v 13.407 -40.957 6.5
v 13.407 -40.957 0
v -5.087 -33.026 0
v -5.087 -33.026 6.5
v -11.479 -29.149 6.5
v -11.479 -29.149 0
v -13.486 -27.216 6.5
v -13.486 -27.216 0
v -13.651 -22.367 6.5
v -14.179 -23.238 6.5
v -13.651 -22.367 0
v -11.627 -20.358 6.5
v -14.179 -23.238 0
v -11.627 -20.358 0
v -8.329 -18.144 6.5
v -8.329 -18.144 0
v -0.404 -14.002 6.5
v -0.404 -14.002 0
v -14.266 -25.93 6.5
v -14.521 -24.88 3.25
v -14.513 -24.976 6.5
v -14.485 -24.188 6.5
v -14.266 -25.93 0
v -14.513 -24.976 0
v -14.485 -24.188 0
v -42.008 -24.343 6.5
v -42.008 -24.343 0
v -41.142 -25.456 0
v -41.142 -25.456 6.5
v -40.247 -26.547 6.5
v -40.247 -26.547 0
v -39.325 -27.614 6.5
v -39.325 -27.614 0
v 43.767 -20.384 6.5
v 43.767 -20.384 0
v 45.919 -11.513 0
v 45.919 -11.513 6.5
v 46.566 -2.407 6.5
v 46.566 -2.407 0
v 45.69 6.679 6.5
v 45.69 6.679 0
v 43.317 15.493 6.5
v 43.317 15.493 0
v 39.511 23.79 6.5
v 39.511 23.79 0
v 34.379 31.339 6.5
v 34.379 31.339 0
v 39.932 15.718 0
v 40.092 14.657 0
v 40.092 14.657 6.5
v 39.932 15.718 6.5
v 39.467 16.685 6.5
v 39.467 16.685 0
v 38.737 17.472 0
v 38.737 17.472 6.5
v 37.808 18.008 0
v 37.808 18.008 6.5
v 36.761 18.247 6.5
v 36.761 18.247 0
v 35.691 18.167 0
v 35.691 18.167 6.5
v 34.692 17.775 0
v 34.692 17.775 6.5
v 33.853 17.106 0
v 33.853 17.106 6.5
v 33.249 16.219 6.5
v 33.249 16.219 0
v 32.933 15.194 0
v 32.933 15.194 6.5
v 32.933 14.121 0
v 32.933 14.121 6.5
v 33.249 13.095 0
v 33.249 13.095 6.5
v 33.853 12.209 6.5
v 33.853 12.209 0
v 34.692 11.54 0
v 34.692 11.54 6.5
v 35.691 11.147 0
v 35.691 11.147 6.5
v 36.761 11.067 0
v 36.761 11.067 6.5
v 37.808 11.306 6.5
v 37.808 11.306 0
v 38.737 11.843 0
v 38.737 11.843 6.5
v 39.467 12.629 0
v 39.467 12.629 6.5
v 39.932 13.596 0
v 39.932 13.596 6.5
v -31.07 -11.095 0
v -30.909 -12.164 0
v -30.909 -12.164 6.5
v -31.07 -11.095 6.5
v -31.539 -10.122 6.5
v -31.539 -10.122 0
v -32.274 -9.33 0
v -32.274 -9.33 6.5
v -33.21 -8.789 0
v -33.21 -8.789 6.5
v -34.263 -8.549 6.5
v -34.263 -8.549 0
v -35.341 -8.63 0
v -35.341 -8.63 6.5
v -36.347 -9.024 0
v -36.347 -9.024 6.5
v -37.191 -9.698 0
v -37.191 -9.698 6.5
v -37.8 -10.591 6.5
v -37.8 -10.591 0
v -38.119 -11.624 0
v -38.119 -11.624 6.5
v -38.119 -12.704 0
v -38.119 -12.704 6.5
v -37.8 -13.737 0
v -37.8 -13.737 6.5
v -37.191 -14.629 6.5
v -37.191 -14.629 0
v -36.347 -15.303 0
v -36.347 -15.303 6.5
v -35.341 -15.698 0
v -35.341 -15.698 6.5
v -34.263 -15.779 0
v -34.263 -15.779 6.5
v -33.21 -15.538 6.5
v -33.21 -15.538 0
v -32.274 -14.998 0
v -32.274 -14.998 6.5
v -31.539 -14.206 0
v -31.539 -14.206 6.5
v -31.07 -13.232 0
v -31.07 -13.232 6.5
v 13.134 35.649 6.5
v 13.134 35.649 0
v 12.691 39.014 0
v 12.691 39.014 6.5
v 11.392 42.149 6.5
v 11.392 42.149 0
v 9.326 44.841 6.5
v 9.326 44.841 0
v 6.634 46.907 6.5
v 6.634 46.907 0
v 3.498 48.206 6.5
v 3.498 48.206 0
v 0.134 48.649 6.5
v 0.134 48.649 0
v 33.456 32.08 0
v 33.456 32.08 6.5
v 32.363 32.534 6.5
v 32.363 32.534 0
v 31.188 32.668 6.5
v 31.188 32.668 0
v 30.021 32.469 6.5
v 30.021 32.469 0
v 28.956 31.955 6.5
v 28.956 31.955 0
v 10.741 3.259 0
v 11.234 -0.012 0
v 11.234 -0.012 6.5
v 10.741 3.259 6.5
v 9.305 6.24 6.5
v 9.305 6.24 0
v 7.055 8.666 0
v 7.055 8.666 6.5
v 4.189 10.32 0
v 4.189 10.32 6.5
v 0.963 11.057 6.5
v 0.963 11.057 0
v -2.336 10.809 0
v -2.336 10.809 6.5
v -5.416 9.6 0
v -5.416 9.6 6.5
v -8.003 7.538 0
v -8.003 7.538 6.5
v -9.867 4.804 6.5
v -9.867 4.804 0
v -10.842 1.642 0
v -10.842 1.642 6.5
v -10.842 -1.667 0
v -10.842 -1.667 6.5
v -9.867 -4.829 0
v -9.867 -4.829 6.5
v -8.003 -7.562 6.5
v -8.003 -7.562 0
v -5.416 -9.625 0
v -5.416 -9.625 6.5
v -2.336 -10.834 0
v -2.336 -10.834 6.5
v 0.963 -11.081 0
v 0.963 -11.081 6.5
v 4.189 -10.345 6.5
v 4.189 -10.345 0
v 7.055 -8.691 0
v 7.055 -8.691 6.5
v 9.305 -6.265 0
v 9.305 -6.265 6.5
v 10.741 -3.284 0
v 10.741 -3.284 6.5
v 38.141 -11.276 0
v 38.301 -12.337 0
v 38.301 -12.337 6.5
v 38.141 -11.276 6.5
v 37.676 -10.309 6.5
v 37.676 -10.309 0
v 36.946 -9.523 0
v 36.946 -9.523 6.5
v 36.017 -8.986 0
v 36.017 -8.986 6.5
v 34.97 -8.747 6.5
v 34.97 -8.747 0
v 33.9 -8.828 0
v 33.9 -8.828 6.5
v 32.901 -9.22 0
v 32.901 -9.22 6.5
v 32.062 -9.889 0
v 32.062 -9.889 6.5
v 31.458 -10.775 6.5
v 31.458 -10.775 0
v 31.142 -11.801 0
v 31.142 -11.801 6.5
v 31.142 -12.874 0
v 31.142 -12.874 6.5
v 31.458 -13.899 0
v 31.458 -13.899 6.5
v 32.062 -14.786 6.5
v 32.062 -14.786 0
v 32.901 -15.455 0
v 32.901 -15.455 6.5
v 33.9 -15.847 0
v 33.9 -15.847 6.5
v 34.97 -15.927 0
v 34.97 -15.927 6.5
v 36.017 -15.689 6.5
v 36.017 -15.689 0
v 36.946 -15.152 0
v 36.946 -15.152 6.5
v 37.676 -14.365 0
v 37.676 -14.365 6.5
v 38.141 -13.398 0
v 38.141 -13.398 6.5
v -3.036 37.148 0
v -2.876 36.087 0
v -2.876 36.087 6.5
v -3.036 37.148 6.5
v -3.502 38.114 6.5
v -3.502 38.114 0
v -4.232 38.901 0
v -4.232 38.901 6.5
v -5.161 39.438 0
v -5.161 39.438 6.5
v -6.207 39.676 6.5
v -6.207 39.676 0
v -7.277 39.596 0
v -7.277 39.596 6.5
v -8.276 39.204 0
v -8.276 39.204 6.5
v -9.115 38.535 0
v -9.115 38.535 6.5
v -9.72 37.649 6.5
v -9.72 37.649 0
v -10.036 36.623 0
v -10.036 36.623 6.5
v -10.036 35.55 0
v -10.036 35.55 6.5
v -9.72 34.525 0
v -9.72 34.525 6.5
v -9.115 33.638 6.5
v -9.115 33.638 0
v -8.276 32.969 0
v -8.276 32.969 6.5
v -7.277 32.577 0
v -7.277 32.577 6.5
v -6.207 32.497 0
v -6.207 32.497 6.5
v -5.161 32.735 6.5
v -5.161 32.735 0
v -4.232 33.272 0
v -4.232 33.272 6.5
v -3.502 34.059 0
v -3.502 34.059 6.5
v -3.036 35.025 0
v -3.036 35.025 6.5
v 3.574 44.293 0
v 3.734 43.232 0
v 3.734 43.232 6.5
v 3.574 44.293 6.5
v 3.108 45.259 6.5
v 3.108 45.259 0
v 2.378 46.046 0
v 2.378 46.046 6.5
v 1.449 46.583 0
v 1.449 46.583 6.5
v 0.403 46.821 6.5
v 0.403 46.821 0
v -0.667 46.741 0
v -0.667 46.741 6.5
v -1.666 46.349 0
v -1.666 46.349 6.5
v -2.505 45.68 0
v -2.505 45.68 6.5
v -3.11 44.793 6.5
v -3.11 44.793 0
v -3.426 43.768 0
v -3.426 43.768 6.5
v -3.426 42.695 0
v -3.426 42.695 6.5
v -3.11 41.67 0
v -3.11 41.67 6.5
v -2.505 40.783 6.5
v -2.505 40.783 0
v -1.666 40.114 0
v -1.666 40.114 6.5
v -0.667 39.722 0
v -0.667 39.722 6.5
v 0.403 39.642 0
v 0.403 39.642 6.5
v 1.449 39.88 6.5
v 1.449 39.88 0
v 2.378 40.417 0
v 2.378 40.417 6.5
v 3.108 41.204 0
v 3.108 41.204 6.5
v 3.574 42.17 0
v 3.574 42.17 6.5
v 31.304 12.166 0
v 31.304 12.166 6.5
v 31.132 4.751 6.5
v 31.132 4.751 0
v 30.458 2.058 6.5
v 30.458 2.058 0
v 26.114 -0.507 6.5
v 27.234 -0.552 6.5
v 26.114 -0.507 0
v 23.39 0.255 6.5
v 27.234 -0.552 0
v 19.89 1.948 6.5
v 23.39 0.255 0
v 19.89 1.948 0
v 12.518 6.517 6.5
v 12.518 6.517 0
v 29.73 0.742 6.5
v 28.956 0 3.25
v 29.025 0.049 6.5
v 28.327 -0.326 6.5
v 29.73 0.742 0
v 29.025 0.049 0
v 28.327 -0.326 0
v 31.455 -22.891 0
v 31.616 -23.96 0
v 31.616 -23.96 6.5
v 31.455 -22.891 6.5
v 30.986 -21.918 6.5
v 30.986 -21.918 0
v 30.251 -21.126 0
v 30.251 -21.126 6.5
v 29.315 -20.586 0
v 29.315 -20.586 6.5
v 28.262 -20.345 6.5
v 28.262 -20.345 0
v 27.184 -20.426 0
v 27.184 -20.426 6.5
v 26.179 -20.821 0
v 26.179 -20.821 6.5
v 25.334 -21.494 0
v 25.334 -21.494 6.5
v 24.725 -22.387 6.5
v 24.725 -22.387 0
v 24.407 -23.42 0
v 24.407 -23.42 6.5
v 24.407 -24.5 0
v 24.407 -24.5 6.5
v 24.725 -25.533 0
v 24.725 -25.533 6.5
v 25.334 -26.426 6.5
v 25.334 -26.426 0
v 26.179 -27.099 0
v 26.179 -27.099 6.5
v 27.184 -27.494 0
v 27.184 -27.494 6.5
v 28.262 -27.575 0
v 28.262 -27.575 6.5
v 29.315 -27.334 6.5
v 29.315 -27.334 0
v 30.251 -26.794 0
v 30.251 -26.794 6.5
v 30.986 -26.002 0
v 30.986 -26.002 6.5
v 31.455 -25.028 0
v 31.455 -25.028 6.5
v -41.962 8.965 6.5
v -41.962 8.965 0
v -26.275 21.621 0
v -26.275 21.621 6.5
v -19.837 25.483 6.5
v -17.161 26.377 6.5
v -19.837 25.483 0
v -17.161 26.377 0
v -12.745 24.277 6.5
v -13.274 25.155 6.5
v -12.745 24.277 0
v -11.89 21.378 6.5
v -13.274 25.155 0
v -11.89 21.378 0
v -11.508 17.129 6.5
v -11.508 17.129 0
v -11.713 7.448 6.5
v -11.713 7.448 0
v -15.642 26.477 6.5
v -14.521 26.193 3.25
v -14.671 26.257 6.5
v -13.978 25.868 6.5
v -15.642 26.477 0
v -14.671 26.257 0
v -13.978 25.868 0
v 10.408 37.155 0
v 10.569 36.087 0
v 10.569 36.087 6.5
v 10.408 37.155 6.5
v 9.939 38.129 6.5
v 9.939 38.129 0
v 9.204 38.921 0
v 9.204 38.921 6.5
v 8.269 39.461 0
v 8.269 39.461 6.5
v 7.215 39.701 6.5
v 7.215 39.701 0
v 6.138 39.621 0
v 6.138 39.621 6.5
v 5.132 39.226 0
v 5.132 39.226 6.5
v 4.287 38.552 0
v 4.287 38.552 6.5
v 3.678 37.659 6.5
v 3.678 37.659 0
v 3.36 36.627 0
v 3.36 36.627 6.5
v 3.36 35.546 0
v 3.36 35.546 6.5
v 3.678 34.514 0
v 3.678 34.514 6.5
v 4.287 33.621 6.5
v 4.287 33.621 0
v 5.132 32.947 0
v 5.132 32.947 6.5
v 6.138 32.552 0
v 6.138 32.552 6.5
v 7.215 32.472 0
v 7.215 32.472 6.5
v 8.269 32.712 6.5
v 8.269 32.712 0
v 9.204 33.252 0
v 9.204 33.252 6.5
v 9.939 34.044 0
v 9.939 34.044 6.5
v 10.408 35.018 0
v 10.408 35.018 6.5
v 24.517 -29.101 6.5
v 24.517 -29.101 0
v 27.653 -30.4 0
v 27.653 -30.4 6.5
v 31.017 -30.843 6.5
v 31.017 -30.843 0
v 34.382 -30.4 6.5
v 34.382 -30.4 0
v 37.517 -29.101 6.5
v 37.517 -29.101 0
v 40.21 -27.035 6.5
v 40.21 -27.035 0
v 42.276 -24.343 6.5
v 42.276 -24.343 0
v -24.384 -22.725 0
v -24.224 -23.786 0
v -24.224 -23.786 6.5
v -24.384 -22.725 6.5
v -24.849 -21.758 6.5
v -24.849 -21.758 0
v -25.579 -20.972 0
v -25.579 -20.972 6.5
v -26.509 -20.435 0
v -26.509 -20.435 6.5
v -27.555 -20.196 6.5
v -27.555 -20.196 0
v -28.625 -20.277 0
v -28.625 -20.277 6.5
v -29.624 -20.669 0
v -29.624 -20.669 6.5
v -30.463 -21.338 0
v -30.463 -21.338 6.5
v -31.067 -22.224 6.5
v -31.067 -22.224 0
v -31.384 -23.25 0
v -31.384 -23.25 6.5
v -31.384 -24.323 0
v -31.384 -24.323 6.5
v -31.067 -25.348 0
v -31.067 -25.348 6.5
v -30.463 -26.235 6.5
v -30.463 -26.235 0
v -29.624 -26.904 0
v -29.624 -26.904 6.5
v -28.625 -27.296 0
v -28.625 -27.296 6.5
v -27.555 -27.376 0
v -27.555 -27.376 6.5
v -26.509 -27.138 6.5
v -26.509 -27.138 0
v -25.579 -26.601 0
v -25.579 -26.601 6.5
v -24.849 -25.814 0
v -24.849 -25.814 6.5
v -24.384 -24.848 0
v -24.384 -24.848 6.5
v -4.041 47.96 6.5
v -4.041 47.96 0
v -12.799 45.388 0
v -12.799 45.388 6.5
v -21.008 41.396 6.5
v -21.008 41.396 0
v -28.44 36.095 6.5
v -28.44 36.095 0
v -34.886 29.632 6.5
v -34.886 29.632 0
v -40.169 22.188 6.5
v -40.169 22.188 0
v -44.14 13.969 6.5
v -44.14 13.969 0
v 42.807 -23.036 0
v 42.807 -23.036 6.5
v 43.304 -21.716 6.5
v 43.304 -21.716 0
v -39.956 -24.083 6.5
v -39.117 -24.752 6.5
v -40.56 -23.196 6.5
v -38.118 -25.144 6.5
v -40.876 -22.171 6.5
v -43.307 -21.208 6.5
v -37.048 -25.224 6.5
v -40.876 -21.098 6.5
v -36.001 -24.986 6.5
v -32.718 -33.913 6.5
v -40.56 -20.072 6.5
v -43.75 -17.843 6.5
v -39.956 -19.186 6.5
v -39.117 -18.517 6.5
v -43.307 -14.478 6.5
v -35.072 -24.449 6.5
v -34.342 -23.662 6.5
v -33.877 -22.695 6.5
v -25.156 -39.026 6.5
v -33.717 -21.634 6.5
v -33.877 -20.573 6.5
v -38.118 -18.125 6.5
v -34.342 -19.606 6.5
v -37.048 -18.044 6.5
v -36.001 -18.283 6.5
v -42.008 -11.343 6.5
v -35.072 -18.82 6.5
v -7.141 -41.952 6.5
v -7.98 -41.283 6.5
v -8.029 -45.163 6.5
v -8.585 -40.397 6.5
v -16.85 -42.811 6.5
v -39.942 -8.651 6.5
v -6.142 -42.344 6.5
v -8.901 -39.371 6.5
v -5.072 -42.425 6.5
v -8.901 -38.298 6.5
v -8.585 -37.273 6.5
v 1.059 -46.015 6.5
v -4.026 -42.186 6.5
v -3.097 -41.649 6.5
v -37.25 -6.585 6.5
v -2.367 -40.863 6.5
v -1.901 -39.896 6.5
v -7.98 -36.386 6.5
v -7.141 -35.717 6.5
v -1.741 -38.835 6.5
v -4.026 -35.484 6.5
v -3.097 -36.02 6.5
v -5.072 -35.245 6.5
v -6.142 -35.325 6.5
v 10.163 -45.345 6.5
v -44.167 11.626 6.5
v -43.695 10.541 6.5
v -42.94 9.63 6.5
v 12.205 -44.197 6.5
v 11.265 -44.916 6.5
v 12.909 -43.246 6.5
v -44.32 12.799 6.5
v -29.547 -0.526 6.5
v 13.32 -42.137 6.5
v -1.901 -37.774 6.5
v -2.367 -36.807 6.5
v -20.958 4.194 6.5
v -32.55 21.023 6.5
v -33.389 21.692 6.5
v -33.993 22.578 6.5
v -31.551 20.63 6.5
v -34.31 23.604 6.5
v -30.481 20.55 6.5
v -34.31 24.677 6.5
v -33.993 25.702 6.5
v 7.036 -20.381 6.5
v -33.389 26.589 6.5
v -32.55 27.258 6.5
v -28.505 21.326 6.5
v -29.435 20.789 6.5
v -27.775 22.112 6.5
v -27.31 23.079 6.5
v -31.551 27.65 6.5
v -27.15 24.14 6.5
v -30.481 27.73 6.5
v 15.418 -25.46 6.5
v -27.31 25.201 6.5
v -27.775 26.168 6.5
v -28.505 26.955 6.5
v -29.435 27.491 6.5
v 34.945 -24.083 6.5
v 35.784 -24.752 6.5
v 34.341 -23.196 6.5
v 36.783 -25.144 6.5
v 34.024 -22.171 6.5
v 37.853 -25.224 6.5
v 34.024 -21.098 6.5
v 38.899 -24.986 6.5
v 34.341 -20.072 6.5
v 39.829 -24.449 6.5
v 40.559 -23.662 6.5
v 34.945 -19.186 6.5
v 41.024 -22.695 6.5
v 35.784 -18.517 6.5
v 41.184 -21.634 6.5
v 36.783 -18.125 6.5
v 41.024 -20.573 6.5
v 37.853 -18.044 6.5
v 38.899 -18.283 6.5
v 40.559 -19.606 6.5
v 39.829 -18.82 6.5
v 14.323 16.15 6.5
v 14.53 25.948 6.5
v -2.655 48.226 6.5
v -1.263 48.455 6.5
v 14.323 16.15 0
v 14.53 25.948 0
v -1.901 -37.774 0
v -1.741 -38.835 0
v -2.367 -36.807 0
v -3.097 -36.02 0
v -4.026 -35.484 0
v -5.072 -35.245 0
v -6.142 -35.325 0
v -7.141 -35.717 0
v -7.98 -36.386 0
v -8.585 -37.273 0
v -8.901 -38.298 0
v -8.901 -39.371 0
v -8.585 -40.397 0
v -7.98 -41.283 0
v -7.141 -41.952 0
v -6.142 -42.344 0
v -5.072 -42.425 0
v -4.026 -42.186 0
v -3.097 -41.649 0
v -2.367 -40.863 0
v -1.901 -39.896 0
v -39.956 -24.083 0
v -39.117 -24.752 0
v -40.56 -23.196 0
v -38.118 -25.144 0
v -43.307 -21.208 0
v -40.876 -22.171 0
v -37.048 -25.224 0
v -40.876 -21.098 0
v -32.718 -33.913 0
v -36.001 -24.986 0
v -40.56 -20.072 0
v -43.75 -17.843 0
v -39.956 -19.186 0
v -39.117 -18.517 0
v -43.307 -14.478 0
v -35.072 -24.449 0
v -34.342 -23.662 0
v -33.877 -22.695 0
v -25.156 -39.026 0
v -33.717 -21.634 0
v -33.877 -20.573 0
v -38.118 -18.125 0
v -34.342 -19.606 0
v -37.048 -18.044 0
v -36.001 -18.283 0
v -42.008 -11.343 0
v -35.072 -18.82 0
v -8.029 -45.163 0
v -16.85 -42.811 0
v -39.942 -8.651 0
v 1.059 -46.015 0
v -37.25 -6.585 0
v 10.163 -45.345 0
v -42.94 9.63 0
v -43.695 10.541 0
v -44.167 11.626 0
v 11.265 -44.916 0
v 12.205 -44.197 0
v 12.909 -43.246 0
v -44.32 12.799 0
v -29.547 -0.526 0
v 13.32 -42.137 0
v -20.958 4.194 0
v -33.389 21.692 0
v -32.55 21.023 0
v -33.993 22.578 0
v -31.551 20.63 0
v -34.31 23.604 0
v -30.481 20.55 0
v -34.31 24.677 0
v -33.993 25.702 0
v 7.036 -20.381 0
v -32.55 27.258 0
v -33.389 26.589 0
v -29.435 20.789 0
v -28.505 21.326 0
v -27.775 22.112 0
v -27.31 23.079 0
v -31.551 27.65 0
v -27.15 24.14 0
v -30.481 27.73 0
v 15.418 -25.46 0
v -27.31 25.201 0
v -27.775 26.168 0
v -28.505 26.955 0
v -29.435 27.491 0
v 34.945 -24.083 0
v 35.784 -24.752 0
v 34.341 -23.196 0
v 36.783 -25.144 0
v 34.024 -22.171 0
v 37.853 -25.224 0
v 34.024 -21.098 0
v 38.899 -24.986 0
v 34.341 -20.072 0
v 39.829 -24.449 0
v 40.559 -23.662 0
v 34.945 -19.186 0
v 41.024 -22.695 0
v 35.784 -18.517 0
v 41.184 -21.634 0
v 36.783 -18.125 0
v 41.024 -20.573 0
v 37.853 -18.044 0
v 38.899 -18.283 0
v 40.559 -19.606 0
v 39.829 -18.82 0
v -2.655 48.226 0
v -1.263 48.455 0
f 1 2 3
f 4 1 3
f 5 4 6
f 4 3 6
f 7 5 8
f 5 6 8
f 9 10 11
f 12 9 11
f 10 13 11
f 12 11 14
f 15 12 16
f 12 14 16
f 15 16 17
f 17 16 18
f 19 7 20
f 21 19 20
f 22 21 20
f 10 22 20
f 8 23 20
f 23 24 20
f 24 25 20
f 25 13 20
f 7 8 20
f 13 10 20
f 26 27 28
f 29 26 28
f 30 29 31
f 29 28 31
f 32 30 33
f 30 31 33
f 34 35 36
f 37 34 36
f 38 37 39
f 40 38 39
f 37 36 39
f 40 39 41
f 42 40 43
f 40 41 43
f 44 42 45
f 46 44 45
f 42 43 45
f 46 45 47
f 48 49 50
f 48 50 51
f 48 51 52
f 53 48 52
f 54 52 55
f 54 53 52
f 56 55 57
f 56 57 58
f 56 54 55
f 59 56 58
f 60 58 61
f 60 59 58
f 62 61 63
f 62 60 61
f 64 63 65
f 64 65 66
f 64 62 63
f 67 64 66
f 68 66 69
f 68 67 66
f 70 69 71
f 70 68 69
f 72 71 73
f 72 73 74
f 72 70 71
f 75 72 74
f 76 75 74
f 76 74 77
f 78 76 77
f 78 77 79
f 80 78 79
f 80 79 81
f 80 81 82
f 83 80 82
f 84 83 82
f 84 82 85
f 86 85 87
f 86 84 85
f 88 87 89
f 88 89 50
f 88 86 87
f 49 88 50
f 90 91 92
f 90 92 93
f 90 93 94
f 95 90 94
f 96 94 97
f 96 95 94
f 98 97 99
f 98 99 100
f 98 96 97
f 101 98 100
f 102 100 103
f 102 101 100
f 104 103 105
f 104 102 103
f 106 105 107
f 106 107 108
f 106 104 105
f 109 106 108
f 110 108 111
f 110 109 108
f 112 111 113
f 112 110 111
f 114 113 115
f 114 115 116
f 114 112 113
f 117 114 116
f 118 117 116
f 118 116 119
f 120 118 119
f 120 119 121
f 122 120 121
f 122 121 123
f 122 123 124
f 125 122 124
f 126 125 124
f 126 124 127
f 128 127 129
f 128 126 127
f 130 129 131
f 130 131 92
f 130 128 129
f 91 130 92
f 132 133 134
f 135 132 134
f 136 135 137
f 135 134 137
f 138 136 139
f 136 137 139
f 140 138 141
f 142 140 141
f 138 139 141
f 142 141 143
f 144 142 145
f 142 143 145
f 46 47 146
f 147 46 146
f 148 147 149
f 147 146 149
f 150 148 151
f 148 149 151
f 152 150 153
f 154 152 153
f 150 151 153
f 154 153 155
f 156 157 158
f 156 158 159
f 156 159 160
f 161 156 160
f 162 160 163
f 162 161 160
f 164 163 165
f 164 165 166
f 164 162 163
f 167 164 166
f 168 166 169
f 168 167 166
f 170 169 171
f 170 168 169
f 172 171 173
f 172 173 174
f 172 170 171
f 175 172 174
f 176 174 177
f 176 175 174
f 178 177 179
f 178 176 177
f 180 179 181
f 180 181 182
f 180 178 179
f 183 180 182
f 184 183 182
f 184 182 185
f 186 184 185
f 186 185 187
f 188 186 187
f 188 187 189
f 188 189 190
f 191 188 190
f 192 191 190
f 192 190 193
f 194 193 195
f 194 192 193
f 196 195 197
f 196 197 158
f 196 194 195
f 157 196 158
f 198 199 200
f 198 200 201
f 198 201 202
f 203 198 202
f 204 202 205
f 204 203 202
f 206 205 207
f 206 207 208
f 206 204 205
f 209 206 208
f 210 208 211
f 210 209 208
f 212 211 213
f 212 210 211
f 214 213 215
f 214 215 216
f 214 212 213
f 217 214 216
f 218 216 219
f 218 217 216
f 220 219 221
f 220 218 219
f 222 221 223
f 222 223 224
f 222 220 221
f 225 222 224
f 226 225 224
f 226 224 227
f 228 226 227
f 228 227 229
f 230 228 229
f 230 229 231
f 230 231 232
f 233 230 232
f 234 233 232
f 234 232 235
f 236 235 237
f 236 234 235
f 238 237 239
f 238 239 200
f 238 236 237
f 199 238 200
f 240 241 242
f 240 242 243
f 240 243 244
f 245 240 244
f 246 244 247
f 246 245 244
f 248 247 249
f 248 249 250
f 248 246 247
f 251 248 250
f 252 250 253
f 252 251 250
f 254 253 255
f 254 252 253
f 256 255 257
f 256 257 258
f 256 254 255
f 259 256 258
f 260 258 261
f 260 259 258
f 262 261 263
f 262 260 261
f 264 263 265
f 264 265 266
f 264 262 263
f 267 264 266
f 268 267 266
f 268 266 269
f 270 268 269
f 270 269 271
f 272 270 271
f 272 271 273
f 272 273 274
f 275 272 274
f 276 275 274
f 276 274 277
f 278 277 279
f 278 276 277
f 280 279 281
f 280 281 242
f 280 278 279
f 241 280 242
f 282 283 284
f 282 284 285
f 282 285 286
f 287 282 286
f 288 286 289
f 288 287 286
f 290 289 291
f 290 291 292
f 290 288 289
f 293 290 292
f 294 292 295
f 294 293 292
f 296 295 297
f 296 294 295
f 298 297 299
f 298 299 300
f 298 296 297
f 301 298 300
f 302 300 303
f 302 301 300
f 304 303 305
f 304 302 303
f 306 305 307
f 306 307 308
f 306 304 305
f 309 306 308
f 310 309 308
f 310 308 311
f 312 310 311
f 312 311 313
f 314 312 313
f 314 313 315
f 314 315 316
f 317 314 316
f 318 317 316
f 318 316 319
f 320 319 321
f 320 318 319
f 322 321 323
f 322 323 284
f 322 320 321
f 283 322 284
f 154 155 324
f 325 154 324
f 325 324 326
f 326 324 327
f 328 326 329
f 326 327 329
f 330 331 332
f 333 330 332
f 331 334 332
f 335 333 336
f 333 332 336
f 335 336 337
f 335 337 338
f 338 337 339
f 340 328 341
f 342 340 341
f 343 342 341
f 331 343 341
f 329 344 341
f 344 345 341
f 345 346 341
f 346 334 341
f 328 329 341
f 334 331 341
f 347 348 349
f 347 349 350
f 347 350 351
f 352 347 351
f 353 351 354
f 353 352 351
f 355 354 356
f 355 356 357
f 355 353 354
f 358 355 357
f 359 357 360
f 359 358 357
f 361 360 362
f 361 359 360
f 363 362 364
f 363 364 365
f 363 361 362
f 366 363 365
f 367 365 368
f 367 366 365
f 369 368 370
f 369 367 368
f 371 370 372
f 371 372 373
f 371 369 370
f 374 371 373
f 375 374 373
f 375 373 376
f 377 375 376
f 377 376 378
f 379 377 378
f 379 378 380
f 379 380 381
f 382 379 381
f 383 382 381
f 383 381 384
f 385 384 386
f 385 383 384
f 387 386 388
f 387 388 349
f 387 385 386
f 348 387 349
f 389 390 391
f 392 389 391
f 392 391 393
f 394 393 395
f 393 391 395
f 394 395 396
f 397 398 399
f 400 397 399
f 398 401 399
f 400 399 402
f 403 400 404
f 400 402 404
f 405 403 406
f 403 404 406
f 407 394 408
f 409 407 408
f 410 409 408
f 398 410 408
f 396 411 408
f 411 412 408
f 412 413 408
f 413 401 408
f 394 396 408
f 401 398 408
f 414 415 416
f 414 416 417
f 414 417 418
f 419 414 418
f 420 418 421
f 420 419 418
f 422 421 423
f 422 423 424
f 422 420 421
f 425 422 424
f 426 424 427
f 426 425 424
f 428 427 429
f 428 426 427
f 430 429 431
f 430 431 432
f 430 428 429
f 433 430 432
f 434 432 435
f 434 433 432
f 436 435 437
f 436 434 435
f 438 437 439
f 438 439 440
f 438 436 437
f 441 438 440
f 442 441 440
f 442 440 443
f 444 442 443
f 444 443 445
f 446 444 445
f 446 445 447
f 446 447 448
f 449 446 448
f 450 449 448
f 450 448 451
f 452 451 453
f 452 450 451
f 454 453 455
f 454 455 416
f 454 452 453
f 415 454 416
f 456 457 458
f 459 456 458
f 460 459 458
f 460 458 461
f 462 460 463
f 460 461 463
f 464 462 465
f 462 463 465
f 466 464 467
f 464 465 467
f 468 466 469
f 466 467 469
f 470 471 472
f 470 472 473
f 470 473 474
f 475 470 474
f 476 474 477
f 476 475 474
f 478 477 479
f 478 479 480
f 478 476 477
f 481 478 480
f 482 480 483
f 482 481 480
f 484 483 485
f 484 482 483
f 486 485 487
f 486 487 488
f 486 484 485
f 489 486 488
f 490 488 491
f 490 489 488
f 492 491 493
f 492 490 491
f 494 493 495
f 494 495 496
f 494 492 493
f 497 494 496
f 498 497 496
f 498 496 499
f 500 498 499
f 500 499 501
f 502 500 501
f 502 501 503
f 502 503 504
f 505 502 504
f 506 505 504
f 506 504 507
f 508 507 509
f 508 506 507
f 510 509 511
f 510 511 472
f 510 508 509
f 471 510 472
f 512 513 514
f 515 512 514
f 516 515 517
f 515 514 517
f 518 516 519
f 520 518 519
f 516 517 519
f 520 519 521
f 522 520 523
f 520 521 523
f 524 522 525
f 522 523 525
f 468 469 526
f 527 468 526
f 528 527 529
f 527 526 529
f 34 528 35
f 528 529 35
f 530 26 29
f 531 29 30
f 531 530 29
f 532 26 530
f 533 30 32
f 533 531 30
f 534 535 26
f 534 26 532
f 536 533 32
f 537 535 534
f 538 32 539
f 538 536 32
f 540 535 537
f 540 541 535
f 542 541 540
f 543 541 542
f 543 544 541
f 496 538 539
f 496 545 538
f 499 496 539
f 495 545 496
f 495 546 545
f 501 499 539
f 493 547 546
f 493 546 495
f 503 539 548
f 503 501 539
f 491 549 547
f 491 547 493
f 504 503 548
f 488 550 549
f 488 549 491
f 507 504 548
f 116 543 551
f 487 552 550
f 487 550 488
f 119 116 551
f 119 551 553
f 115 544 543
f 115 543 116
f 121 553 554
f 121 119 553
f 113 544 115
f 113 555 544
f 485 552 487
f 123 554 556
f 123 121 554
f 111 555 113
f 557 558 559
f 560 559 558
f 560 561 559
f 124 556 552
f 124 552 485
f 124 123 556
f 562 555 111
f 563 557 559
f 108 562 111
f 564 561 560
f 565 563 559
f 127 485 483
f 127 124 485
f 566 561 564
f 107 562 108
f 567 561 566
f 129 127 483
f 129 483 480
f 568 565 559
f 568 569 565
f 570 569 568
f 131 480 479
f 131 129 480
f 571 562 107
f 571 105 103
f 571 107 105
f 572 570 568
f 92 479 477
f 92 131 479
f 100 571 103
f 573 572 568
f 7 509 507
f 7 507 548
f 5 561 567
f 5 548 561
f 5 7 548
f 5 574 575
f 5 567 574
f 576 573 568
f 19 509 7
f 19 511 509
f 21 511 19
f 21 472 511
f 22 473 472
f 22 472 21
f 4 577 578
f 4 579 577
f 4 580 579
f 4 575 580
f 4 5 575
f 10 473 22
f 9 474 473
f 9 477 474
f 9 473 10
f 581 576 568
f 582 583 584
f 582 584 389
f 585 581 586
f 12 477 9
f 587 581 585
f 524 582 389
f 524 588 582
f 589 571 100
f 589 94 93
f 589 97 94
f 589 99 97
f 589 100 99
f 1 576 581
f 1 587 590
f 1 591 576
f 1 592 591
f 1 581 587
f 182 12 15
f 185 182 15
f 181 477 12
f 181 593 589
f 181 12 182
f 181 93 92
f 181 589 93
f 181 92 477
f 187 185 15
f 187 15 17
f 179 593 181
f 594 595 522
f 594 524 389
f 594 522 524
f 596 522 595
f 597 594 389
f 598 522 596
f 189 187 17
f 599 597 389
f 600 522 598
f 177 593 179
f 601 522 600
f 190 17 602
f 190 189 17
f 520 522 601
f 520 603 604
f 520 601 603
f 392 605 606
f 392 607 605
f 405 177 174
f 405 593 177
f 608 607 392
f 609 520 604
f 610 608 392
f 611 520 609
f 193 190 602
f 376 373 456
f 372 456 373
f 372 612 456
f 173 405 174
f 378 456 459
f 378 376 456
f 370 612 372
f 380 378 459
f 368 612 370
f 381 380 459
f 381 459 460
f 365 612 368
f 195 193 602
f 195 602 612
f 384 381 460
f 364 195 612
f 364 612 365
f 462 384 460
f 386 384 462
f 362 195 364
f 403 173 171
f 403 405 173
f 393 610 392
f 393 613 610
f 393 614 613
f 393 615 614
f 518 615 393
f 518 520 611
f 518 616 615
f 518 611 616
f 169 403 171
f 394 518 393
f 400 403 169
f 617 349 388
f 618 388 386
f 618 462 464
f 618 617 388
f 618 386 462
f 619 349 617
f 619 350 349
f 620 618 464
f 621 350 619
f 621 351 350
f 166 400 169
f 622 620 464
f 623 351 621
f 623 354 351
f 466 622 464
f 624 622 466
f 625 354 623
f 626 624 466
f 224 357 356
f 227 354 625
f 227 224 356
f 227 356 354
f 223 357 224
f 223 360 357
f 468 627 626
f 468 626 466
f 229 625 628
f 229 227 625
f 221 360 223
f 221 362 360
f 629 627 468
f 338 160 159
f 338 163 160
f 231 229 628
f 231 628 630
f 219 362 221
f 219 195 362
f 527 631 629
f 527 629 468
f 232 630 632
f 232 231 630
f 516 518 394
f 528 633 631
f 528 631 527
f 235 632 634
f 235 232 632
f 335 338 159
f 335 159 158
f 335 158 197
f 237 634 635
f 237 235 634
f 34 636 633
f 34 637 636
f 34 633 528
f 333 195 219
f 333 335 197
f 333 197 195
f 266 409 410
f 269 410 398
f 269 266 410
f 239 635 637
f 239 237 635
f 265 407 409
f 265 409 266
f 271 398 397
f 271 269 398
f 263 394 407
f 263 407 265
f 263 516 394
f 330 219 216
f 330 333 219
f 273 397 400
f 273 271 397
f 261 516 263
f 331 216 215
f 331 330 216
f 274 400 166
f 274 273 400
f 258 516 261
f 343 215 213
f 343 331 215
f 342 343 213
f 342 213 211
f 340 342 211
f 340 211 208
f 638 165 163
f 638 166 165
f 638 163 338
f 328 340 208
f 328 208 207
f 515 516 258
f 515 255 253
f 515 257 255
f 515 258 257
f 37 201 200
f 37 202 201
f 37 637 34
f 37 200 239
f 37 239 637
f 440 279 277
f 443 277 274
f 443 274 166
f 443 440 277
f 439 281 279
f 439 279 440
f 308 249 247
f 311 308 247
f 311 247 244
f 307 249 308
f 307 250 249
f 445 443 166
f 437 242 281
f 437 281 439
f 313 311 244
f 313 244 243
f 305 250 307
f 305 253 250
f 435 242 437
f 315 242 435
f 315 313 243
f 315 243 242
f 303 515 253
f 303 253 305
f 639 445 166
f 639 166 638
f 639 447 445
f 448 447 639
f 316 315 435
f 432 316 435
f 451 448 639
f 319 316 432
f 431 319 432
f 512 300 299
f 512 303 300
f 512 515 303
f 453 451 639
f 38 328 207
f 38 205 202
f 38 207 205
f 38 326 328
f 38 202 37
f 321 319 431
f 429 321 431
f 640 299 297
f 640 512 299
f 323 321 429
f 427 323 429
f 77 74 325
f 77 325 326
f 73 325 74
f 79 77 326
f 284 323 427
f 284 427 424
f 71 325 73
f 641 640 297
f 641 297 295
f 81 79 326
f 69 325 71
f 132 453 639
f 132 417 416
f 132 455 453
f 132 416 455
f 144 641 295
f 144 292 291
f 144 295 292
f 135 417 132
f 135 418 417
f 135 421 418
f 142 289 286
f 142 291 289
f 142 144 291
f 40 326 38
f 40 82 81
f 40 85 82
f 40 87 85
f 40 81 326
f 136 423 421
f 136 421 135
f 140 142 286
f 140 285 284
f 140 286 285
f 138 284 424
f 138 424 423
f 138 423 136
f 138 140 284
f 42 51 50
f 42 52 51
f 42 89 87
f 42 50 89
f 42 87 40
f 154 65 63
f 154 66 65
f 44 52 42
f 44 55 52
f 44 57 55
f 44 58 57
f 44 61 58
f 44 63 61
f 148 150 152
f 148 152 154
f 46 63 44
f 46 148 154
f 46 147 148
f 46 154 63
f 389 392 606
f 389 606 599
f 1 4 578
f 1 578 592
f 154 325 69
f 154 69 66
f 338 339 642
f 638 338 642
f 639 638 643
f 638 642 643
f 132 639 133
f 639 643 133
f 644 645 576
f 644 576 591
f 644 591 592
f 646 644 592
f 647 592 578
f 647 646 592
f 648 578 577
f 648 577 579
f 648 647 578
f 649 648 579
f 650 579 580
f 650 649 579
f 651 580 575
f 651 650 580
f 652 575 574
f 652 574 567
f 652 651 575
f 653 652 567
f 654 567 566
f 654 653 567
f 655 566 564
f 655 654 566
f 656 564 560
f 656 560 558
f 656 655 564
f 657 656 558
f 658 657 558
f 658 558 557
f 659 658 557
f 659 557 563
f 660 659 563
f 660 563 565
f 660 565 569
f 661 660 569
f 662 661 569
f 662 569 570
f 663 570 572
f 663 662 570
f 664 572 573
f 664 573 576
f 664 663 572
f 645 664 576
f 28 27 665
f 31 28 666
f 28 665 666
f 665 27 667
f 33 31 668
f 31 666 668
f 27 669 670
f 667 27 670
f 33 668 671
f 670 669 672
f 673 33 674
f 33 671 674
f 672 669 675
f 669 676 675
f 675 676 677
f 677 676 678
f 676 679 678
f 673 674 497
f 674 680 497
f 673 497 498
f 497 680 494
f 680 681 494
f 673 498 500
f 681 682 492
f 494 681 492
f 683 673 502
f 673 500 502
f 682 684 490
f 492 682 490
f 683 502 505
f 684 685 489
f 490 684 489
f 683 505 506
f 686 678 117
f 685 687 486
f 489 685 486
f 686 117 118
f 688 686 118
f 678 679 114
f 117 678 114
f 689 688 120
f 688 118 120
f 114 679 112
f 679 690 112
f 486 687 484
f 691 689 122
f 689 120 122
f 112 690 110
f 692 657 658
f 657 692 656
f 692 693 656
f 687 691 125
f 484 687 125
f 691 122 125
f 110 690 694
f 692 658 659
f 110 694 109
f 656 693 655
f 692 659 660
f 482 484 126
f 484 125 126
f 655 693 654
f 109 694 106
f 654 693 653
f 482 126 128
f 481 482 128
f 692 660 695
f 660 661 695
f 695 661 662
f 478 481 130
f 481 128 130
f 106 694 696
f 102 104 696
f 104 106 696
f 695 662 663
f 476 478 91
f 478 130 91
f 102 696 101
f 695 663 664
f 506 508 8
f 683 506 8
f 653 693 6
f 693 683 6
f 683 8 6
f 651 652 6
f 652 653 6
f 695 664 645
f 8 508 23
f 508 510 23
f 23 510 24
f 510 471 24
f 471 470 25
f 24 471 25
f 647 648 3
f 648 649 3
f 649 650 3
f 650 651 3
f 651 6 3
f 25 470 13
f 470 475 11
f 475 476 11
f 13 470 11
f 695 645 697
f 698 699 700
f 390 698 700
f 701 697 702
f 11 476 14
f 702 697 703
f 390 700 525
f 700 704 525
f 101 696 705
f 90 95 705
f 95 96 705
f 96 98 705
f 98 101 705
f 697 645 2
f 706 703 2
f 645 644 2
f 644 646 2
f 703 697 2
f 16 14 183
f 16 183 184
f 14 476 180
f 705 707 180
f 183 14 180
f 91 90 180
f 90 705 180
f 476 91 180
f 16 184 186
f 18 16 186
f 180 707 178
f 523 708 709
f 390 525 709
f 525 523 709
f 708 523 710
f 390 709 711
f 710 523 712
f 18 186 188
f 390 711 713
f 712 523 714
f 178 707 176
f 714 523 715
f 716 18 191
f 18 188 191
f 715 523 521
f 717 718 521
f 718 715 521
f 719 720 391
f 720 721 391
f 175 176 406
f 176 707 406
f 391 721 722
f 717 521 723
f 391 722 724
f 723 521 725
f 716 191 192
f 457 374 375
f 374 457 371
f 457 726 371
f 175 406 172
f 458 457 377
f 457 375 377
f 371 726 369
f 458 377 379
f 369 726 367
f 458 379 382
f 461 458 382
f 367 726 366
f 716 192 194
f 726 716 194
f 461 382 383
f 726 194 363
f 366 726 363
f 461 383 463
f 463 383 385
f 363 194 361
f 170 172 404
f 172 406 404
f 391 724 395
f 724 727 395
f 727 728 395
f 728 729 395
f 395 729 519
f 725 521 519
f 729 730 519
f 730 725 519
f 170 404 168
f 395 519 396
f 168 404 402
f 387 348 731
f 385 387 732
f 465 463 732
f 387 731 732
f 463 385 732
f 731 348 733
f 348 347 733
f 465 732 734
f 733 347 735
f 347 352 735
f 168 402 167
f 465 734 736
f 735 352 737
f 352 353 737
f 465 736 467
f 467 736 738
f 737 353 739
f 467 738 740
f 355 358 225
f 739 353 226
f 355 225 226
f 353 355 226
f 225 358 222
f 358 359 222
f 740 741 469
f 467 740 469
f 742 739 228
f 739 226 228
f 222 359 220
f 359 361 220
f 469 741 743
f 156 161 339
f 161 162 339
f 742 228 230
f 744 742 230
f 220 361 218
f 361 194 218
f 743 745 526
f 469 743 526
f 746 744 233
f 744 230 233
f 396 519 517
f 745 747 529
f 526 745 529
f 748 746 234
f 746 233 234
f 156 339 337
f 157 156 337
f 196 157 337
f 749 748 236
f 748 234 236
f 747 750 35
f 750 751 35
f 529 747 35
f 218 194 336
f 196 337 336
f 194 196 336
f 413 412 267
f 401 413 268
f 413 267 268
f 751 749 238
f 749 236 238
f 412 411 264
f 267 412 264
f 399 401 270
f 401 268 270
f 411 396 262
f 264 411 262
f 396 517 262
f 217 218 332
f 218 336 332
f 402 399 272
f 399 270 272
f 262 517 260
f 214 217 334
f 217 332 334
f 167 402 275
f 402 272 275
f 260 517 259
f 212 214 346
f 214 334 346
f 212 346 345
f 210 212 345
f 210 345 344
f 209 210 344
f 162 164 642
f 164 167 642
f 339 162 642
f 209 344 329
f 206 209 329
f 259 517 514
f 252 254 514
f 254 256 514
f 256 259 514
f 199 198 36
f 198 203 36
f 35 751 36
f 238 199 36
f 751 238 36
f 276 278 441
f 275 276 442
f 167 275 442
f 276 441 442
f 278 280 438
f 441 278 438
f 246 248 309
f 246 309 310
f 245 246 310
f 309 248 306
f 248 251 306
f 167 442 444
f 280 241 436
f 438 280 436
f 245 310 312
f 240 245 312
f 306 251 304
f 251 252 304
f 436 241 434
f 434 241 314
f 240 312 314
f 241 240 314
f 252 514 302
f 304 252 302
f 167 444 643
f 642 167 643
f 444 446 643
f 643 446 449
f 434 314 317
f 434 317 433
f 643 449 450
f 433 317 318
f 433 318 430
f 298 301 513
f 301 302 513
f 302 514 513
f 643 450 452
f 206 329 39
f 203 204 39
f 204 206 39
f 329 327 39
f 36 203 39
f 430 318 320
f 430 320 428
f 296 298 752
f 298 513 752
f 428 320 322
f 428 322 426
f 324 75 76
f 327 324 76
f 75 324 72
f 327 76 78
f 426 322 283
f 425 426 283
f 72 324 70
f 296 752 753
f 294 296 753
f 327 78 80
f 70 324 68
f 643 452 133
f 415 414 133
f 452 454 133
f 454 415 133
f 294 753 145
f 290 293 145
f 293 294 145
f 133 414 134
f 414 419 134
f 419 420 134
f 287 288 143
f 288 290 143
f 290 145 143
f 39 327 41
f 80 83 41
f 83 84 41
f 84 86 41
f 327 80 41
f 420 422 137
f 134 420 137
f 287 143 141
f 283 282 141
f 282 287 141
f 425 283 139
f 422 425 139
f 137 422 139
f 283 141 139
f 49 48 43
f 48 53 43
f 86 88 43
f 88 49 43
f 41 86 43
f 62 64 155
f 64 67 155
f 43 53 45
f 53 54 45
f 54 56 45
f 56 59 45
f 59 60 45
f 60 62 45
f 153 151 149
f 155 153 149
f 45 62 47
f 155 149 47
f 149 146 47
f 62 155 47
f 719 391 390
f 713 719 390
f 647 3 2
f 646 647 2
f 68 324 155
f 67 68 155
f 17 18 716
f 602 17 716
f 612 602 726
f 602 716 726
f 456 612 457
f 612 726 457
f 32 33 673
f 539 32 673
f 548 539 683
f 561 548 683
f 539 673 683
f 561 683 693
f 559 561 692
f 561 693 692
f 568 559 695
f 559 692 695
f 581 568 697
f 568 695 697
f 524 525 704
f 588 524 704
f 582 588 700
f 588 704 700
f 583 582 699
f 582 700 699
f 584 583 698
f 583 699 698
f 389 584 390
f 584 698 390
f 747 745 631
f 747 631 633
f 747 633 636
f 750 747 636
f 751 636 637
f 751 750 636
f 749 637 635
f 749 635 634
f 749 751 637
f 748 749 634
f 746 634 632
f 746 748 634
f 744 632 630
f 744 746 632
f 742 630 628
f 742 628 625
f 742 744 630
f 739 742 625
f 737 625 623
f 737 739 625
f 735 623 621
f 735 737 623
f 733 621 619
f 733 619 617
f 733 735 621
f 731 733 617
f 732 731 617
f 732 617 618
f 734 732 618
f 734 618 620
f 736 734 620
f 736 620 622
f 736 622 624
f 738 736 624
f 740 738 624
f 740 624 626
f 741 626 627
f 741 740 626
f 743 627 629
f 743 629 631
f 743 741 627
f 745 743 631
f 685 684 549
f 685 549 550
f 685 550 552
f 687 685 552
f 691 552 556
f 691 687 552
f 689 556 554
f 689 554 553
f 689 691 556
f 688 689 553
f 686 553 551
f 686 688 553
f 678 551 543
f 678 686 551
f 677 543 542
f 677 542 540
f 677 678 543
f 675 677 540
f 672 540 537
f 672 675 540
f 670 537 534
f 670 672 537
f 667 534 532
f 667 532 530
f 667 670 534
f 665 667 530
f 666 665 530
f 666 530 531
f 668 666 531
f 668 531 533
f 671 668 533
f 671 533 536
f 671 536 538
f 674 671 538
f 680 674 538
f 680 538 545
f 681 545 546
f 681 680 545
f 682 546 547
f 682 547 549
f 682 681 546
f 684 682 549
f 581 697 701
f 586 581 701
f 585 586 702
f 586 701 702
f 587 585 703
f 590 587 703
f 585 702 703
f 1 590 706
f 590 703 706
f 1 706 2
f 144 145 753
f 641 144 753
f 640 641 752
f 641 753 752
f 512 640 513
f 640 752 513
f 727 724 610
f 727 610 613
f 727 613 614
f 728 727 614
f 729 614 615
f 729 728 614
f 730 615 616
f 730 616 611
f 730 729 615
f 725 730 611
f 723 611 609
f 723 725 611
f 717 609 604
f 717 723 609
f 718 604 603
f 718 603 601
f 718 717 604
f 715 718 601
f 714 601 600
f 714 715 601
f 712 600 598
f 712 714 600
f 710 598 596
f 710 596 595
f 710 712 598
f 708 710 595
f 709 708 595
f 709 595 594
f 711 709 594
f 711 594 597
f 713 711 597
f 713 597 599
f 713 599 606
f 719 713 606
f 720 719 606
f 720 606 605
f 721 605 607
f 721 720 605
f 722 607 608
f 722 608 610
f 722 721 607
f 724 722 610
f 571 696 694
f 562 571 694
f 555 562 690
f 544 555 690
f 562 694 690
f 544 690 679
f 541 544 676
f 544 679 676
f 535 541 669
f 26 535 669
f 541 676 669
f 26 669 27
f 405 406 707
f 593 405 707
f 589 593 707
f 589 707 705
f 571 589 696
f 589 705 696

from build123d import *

# Parameters (mm, degrees)
F0_R     = 3.6
F0_R_2   = 3.625
F0_R_3   = 11.1
F1_DEPTH = 6.5


with BuildPart() as f1:
    # F0 (on Top) → F1 (new body)
    with BuildSketch(Plane.XY):
        with BuildLine():
            add(Edge.make_bspline(
                [(-41.9615497958, 8.9646982505), (-30.569933299, 18.648762587), (-10.4654788804, 35.7396495649), (-11.3357932008, 16.00177224), (-11.7129686992, 7.4478009422)],
                knots=[0, 0, 0, 0, 0.5666215188, 1, 1, 1, 1], degree=3))
            ThreePointArc((-11.7129686992, 7.4478009422), (-9.5564167843, 17.8339532115), (-10.6477440022, 28.385345538))
            ThreePointArc((-10.6477440022, 28.385345538), (-12.0864234677, 31.2141495186), (-12.7968132244, 34.3072510298))
            ThreePointArc((-12.7968132244, 34.3072510298), (-10.809160747, 42.6668712415), (-4.0406760994, 47.9604171261))
            ThreePointArc((-4.0406760994, 47.9604171261), (-28.4395123023, 36.0950208303), (-44.1400961488, 13.9685094878))
            ThreePointArc((-44.1400961488, 13.9685094878), (-43.969487255, 11.0666381974), (-41.9615497958, 8.9646982505))
        make_face()
        with Locations((-30.7498083919, 24.1402272244)):
            Circle(F0_R, mode=Mode.SUBTRACT)
        with BuildLine():
            ThreePointArc((-12.7968132244, 34.3072510298), (-12.0864234677, 31.2141495186), (-10.6477440022, 28.385345538))
            ThreePointArc((-10.6477440022, 28.385345538), (-11.5872203484, 31.3953111499), (-12.7968132244, 34.3072510298))
        make_face()
        with BuildLine():
            ThreePointArc((10.1354725507, 9.7838140319), (11.2789155437, 8.1156101199), (12.5178738246, 6.5170643594))
            ThreePointArc((12.5178738246, 6.5170643594), (11.4452241776, 8.2368970077), (10.1354725507, 9.7838140319))
        make_face()
        with BuildLine():
            ThreePointArc((36.3207621947, -5.9740237918), (33.2868628312, -5.0426886121), (30.1177069889, -4.8742195868))
            ThreePointArc((30.1177069889, -4.8742195868), (33.1941518464, -5.5655920107), (36.3207621947, -5.9740237918))
        make_face()
        with BuildLine():
            ThreePointArc((-13.3508562664, 3.7512060808), (-12.4778707964, 5.5755587165), (-11.7129686992, 7.4478009422))
            ThreePointArc((-11.7129686992, 7.4478009422), (-12.6660626394, 5.6589427744), (-13.3508562664, 3.7512060808))
        make_face()
        with BuildLine():
            ThreePointArc((12.5178738246, 6.5170643594), (13.7237945853, 3.3508166981), (14.1337720544, -0.0124090761))
            ThreePointArc((14.1337720544, -0.0124090761), (11.1963438517, -8.5925900316), (3.6166998789, -13.572247341))
            ThreePointArc((3.6166998789, -13.572247341), (1.622154625, -13.9330670104), (-0.4035889622, -14.0020925299))
            ThreePointArc((-0.4035889622, -14.0020925299), (11.1232254291, -23.092711045), (24.5173530526, -29.1013831282))
            ThreePointArc((24.5173530526, -29.1013831282), (18.3513531402, -14.9151788691), (30.1177069889, -4.8742195868))
            ThreePointArc((30.1177069889, -4.8742195868), (20.43426958, -0.5436405181), (12.5178738246, 6.5170643594))
        make_face()
        with BuildLine():
            ThreePointArc((-0.4035889622, -14.0020925299), (1.622154625, -13.9330670104), (3.6166998789, -13.572247341))
            ThreePointArc((3.6166998789, -13.572247341), (1.6002714159, -13.7283960646), (-0.4035889622, -14.0020925299))
        make_face()
        with BuildLine():
            ThreePointArc((-23.1226328071, -28.3704544662), (-20.7991232003, -26.2086881348), (-19.0686468235, -23.5483531795))
            ThreePointArc((-19.0686468235, -23.5483531795), (-21.2056153348, -25.8669463675), (-23.1226328071, -28.3704544662))
        make_face()
        with BuildLine():
            ThreePointArc((-23.1226328071, -28.3704544662), (-21.2056153348, -25.8669463675), (-19.0686468235, -23.5483531795))
            ThreePointArc((-19.0686468235, -23.5483531795), (-18.0838090314, -20.7709268889), (-17.7498089439, -17.843052879))
            ThreePointArc((-17.7498089439, -17.843052879), (-24.2498089439, -6.5847226298), (-37.2498089439, -6.5847226298))
            ThreePointArc((-37.2498089439, -6.5847226298), (-43.3068446856, -14.4784052926), (-42.0081391931, -24.343052879))
            ThreePointArc((-42.0081391931, -24.343052879), (-40.6980388825, -26.0044707959), (-39.3246900511, -27.6140003252))
            ThreePointArc((-39.3246900511, -27.6140003252), (-31.3561025152, -30.8289070328), (-23.1226328071, -28.3704544662))
        make_face()
        with Locations((-27.8237756349, -23.7863854433)):
            Circle(F0_R, mode=Mode.SUBTRACT)
        with Locations((-37.316566437, -21.6343720853)):
            Circle(F0_R, mode=Mode.SUBTRACT)
        with Locations((-34.5340873465, -12.1637846242)):
            Circle(F0_R_2, mode=Mode.SUBTRACT)
        with BuildLine():
            ThreePointArc((-19.0686468235, -23.5483531795), (-10.4765366325, -17.3275399217), (-0.4035889622, -14.0020925299))
            ThreePointArc((-0.4035889622, -14.0020925299), (-11.1776800688, -8.2617151599), (-13.3508562664, 3.7512060808))
            ThreePointArc((-13.3508562664, 3.7512060808), (-12.6660626394, 5.6589427744), (-11.7129686992, 7.4478009422))
            ThreePointArc((-11.7129686992, 7.4478009422), (-25.349082465, 2.0105961121), (-37.2498089439, -6.5847226298))
            ThreePointArc((-37.2498089439, -6.5847226298), (-24.2498089439, -6.5847226298), (-17.7498089439, -17.843052879))
            ThreePointArc((-17.7498089439, -17.843052879), (-18.0838090314, -20.7709268889), (-19.0686468235, -23.5483531795))
        make_face()
        with BuildLine():
            ThreePointArc((3.6166998789, -13.572247341), (11.1963438517, -8.5925900316), (14.1337720544, -0.0124090761))
            ThreePointArc((14.1337720544, -0.0124090761), (13.7237945853, 3.3508166981), (12.5178738246, 6.5170643594))
            ThreePointArc((12.5178738246, 6.5170643594), (11.2789155437, 8.1156101199), (10.1354725507, 9.7838140319))
            ThreePointArc((10.1354725507, 9.7838140319), (-1.3546105162, 13.9082488582), (-11.7129686992, 7.4478009422))
            ThreePointArc((-11.7129686992, 7.4478009422), (-12.4778707964, 5.5755587165), (-13.3508562664, 3.7512060808))
            ThreePointArc((-13.3508562664, 3.7512060808), (-11.1776800688, -8.2617151599), (-0.4035889622, -14.0020925299))
            ThreePointArc((-0.4035889622, -14.0020925299), (1.6002714159, -13.7283960646), (3.6166998789, -13.572247341))
        make_face()
        with Locations((0.1337720544, -0.0124090761)):
            Circle(F0_R_3, mode=Mode.SUBTRACT)
        with BuildLine():
            ThreePointArc((10.1354725507, 9.7838140319), (11.4452241776, 8.2368970077), (12.5178738246, 6.5170643594))
            ThreePointArc((12.5178738246, 6.5170643594), (14.6271731991, 21.0448877045), (13.1337720544, 35.6488785297))
            ThreePointArc((13.1337720544, 35.6488785297), (3.931158739, 23.2158638362), (-10.6477440022, 28.385345538))
            ThreePointArc((-10.6477440022, 28.385345538), (-9.5564167843, 17.8339532115), (-11.7129686992, 7.4478009422))
            ThreePointArc((-11.7129686992, 7.4478009422), (-1.3546105162, 13.9082488582), (10.1354725507, 9.7838140319))
        make_face()
        with BuildLine():
            ThreePointArc((-10.6477440022, 28.385345538), (3.931158739, 23.2158638362), (13.1337720544, 35.6488785297))
            ThreePointArc((13.1337720544, 35.6488785297), (9.3261602098, 44.8412666851), (0.1337720544, 48.6488785297))
            ThreePointArc((0.1337720544, 48.6488785297), (-1.9601082232, 48.3450073376), (-4.0406760994, 47.9604171261))
            ThreePointArc((-4.0406760994, 47.9604171261), (-10.809160747, 42.6668712415), (-12.7968132244, 34.3072510298))
            ThreePointArc((-12.7968132244, 34.3072510298), (-11.5872203484, 31.3953111499), (-10.6477440022, 28.385345538))
        make_face()
        with Locations((-6.4763215839, 36.0865256339)):
            Circle(F0_R, mode=Mode.SUBTRACT)
        with Locations((0.1337720544, 43.2315169424)):
            Circle(F0_R, mode=Mode.SUBTRACT)
        with Locations((6.9443018392, 36.0865256339)):
            Circle(F0_R_2, mode=Mode.SUBTRACT)
        with BuildLine():
            add(Edge.make_bspline(
                [(28.9558359768, 31.9546553634), (31.0677227866, 17.411849131), (34.7506167144, -7.9491751987), (19.1658477828, 2.1914089811), (12.5178738246, 6.5170643594)],
                knots=[0, 0, 0, 0, 0.5734313427, 1, 1, 1, 1], degree=3))
            ThreePointArc((12.5178738246, 6.5170643594), (20.43426958, -0.5436405181), (30.1177069889, -4.8742195868))
            ThreePointArc((30.1177069889, -4.8742195868), (33.2868628312, -5.0426886121), (36.3207621947, -5.9740237918))
            ThreePointArc((36.3207621947, -5.9740237918), (41.9247890219, -10.770016715), (44.0173530526, -17.843052879))
            ThreePointArc((44.0173530526, -17.843052879), (43.9545335877, -19.1195166673), (43.7666823137, -20.3836440292))
            ThreePointArc((43.7666823137, -20.3836440292), (45.6903657971, 6.6790660932), (34.3785368006, 31.3394262297))
            ThreePointArc((34.3785368006, 31.3394262297), (31.7801380977, 32.6426102387), (28.9558359768, 31.9546553634))
        make_face()
        with Locations((36.4923588821, 14.657238)):
            Circle(F0_R, mode=Mode.SUBTRACT)
        with BuildLine():
            ThreePointArc((36.3207621947, -5.9740237918), (33.1941518464, -5.5655920107), (30.1177069889, -4.8742195868))
            ThreePointArc((30.1177069889, -4.8742195868), (18.3513531402, -14.9151788691), (24.5173530526, -29.1013831282))
            ThreePointArc((24.5173530526, -29.1013831282), (34.382000639, -30.4000886207), (42.2756833018, -24.343052879))
            ThreePointArc((42.2756833018, -24.343052879), (43.0594632689, -22.3777637701), (43.7666823137, -20.3836440292))
            ThreePointArc((43.7666823137, -20.3836440292), (43.9545335877, -19.1195166673), (44.0173530526, -17.843052879))
            ThreePointArc((44.0173530526, -17.843052879), (41.9247890219, -10.770016715), (36.3207621947, -5.9740237918))
        make_face()
        with Locations((27.9911016704, -23.959968238)):
            Circle(F0_R_2, mode=Mode.SUBTRACT)
        with Locations((34.701413382, -12.3373674189)):
            Circle(F0_R, mode=Mode.SUBTRACT)
        with Locations((37.5841105458, -21.6343720853)):
            Circle(F0_R, mode=Mode.SUBTRACT)
        with BuildLine():
            add(Edge.make_bspline(
                [(13.4070299822, -40.9565808422), (-0.38617217, -35.4591540627), (-24.4370750547, -25.8734120334), (-7.5892007885, -17.5514192272), (-0.4035889622, -14.0020925299)],
                knots=[0, 0, 0, 0, 0.5735003887, 1, 1, 1, 1], degree=3))
            ThreePointArc((-0.4035889622, -14.0020925299), (-10.4765366325, -17.3275399217), (-19.0686468235, -23.5483531795))
            ThreePointArc((-19.0686468235, -23.5483531795), (-20.7991232003, -26.2086881348), (-23.1226328071, -28.3704544662))
            ThreePointArc((-23.1226328071, -28.3704544662), (-31.3561025152, -30.8289070328), (-39.3246900511, -27.6140003252))
            ThreePointArc((-39.3246900511, -27.6140003252), (-16.8495373316, -42.8113141518), (10.1628755114, -45.3451629458))
            ThreePointArc((10.1628755114, -45.3451629458), (12.5906653205, -43.7464756645), (13.4070299822, -40.9565808422))
        make_face()
        with Locations((-5.3412343271, -38.8346924526)):
            Circle(F0_R, mode=Mode.SUBTRACT)
    extrude(amount=F1_DEPTH)


solid = f1.part
